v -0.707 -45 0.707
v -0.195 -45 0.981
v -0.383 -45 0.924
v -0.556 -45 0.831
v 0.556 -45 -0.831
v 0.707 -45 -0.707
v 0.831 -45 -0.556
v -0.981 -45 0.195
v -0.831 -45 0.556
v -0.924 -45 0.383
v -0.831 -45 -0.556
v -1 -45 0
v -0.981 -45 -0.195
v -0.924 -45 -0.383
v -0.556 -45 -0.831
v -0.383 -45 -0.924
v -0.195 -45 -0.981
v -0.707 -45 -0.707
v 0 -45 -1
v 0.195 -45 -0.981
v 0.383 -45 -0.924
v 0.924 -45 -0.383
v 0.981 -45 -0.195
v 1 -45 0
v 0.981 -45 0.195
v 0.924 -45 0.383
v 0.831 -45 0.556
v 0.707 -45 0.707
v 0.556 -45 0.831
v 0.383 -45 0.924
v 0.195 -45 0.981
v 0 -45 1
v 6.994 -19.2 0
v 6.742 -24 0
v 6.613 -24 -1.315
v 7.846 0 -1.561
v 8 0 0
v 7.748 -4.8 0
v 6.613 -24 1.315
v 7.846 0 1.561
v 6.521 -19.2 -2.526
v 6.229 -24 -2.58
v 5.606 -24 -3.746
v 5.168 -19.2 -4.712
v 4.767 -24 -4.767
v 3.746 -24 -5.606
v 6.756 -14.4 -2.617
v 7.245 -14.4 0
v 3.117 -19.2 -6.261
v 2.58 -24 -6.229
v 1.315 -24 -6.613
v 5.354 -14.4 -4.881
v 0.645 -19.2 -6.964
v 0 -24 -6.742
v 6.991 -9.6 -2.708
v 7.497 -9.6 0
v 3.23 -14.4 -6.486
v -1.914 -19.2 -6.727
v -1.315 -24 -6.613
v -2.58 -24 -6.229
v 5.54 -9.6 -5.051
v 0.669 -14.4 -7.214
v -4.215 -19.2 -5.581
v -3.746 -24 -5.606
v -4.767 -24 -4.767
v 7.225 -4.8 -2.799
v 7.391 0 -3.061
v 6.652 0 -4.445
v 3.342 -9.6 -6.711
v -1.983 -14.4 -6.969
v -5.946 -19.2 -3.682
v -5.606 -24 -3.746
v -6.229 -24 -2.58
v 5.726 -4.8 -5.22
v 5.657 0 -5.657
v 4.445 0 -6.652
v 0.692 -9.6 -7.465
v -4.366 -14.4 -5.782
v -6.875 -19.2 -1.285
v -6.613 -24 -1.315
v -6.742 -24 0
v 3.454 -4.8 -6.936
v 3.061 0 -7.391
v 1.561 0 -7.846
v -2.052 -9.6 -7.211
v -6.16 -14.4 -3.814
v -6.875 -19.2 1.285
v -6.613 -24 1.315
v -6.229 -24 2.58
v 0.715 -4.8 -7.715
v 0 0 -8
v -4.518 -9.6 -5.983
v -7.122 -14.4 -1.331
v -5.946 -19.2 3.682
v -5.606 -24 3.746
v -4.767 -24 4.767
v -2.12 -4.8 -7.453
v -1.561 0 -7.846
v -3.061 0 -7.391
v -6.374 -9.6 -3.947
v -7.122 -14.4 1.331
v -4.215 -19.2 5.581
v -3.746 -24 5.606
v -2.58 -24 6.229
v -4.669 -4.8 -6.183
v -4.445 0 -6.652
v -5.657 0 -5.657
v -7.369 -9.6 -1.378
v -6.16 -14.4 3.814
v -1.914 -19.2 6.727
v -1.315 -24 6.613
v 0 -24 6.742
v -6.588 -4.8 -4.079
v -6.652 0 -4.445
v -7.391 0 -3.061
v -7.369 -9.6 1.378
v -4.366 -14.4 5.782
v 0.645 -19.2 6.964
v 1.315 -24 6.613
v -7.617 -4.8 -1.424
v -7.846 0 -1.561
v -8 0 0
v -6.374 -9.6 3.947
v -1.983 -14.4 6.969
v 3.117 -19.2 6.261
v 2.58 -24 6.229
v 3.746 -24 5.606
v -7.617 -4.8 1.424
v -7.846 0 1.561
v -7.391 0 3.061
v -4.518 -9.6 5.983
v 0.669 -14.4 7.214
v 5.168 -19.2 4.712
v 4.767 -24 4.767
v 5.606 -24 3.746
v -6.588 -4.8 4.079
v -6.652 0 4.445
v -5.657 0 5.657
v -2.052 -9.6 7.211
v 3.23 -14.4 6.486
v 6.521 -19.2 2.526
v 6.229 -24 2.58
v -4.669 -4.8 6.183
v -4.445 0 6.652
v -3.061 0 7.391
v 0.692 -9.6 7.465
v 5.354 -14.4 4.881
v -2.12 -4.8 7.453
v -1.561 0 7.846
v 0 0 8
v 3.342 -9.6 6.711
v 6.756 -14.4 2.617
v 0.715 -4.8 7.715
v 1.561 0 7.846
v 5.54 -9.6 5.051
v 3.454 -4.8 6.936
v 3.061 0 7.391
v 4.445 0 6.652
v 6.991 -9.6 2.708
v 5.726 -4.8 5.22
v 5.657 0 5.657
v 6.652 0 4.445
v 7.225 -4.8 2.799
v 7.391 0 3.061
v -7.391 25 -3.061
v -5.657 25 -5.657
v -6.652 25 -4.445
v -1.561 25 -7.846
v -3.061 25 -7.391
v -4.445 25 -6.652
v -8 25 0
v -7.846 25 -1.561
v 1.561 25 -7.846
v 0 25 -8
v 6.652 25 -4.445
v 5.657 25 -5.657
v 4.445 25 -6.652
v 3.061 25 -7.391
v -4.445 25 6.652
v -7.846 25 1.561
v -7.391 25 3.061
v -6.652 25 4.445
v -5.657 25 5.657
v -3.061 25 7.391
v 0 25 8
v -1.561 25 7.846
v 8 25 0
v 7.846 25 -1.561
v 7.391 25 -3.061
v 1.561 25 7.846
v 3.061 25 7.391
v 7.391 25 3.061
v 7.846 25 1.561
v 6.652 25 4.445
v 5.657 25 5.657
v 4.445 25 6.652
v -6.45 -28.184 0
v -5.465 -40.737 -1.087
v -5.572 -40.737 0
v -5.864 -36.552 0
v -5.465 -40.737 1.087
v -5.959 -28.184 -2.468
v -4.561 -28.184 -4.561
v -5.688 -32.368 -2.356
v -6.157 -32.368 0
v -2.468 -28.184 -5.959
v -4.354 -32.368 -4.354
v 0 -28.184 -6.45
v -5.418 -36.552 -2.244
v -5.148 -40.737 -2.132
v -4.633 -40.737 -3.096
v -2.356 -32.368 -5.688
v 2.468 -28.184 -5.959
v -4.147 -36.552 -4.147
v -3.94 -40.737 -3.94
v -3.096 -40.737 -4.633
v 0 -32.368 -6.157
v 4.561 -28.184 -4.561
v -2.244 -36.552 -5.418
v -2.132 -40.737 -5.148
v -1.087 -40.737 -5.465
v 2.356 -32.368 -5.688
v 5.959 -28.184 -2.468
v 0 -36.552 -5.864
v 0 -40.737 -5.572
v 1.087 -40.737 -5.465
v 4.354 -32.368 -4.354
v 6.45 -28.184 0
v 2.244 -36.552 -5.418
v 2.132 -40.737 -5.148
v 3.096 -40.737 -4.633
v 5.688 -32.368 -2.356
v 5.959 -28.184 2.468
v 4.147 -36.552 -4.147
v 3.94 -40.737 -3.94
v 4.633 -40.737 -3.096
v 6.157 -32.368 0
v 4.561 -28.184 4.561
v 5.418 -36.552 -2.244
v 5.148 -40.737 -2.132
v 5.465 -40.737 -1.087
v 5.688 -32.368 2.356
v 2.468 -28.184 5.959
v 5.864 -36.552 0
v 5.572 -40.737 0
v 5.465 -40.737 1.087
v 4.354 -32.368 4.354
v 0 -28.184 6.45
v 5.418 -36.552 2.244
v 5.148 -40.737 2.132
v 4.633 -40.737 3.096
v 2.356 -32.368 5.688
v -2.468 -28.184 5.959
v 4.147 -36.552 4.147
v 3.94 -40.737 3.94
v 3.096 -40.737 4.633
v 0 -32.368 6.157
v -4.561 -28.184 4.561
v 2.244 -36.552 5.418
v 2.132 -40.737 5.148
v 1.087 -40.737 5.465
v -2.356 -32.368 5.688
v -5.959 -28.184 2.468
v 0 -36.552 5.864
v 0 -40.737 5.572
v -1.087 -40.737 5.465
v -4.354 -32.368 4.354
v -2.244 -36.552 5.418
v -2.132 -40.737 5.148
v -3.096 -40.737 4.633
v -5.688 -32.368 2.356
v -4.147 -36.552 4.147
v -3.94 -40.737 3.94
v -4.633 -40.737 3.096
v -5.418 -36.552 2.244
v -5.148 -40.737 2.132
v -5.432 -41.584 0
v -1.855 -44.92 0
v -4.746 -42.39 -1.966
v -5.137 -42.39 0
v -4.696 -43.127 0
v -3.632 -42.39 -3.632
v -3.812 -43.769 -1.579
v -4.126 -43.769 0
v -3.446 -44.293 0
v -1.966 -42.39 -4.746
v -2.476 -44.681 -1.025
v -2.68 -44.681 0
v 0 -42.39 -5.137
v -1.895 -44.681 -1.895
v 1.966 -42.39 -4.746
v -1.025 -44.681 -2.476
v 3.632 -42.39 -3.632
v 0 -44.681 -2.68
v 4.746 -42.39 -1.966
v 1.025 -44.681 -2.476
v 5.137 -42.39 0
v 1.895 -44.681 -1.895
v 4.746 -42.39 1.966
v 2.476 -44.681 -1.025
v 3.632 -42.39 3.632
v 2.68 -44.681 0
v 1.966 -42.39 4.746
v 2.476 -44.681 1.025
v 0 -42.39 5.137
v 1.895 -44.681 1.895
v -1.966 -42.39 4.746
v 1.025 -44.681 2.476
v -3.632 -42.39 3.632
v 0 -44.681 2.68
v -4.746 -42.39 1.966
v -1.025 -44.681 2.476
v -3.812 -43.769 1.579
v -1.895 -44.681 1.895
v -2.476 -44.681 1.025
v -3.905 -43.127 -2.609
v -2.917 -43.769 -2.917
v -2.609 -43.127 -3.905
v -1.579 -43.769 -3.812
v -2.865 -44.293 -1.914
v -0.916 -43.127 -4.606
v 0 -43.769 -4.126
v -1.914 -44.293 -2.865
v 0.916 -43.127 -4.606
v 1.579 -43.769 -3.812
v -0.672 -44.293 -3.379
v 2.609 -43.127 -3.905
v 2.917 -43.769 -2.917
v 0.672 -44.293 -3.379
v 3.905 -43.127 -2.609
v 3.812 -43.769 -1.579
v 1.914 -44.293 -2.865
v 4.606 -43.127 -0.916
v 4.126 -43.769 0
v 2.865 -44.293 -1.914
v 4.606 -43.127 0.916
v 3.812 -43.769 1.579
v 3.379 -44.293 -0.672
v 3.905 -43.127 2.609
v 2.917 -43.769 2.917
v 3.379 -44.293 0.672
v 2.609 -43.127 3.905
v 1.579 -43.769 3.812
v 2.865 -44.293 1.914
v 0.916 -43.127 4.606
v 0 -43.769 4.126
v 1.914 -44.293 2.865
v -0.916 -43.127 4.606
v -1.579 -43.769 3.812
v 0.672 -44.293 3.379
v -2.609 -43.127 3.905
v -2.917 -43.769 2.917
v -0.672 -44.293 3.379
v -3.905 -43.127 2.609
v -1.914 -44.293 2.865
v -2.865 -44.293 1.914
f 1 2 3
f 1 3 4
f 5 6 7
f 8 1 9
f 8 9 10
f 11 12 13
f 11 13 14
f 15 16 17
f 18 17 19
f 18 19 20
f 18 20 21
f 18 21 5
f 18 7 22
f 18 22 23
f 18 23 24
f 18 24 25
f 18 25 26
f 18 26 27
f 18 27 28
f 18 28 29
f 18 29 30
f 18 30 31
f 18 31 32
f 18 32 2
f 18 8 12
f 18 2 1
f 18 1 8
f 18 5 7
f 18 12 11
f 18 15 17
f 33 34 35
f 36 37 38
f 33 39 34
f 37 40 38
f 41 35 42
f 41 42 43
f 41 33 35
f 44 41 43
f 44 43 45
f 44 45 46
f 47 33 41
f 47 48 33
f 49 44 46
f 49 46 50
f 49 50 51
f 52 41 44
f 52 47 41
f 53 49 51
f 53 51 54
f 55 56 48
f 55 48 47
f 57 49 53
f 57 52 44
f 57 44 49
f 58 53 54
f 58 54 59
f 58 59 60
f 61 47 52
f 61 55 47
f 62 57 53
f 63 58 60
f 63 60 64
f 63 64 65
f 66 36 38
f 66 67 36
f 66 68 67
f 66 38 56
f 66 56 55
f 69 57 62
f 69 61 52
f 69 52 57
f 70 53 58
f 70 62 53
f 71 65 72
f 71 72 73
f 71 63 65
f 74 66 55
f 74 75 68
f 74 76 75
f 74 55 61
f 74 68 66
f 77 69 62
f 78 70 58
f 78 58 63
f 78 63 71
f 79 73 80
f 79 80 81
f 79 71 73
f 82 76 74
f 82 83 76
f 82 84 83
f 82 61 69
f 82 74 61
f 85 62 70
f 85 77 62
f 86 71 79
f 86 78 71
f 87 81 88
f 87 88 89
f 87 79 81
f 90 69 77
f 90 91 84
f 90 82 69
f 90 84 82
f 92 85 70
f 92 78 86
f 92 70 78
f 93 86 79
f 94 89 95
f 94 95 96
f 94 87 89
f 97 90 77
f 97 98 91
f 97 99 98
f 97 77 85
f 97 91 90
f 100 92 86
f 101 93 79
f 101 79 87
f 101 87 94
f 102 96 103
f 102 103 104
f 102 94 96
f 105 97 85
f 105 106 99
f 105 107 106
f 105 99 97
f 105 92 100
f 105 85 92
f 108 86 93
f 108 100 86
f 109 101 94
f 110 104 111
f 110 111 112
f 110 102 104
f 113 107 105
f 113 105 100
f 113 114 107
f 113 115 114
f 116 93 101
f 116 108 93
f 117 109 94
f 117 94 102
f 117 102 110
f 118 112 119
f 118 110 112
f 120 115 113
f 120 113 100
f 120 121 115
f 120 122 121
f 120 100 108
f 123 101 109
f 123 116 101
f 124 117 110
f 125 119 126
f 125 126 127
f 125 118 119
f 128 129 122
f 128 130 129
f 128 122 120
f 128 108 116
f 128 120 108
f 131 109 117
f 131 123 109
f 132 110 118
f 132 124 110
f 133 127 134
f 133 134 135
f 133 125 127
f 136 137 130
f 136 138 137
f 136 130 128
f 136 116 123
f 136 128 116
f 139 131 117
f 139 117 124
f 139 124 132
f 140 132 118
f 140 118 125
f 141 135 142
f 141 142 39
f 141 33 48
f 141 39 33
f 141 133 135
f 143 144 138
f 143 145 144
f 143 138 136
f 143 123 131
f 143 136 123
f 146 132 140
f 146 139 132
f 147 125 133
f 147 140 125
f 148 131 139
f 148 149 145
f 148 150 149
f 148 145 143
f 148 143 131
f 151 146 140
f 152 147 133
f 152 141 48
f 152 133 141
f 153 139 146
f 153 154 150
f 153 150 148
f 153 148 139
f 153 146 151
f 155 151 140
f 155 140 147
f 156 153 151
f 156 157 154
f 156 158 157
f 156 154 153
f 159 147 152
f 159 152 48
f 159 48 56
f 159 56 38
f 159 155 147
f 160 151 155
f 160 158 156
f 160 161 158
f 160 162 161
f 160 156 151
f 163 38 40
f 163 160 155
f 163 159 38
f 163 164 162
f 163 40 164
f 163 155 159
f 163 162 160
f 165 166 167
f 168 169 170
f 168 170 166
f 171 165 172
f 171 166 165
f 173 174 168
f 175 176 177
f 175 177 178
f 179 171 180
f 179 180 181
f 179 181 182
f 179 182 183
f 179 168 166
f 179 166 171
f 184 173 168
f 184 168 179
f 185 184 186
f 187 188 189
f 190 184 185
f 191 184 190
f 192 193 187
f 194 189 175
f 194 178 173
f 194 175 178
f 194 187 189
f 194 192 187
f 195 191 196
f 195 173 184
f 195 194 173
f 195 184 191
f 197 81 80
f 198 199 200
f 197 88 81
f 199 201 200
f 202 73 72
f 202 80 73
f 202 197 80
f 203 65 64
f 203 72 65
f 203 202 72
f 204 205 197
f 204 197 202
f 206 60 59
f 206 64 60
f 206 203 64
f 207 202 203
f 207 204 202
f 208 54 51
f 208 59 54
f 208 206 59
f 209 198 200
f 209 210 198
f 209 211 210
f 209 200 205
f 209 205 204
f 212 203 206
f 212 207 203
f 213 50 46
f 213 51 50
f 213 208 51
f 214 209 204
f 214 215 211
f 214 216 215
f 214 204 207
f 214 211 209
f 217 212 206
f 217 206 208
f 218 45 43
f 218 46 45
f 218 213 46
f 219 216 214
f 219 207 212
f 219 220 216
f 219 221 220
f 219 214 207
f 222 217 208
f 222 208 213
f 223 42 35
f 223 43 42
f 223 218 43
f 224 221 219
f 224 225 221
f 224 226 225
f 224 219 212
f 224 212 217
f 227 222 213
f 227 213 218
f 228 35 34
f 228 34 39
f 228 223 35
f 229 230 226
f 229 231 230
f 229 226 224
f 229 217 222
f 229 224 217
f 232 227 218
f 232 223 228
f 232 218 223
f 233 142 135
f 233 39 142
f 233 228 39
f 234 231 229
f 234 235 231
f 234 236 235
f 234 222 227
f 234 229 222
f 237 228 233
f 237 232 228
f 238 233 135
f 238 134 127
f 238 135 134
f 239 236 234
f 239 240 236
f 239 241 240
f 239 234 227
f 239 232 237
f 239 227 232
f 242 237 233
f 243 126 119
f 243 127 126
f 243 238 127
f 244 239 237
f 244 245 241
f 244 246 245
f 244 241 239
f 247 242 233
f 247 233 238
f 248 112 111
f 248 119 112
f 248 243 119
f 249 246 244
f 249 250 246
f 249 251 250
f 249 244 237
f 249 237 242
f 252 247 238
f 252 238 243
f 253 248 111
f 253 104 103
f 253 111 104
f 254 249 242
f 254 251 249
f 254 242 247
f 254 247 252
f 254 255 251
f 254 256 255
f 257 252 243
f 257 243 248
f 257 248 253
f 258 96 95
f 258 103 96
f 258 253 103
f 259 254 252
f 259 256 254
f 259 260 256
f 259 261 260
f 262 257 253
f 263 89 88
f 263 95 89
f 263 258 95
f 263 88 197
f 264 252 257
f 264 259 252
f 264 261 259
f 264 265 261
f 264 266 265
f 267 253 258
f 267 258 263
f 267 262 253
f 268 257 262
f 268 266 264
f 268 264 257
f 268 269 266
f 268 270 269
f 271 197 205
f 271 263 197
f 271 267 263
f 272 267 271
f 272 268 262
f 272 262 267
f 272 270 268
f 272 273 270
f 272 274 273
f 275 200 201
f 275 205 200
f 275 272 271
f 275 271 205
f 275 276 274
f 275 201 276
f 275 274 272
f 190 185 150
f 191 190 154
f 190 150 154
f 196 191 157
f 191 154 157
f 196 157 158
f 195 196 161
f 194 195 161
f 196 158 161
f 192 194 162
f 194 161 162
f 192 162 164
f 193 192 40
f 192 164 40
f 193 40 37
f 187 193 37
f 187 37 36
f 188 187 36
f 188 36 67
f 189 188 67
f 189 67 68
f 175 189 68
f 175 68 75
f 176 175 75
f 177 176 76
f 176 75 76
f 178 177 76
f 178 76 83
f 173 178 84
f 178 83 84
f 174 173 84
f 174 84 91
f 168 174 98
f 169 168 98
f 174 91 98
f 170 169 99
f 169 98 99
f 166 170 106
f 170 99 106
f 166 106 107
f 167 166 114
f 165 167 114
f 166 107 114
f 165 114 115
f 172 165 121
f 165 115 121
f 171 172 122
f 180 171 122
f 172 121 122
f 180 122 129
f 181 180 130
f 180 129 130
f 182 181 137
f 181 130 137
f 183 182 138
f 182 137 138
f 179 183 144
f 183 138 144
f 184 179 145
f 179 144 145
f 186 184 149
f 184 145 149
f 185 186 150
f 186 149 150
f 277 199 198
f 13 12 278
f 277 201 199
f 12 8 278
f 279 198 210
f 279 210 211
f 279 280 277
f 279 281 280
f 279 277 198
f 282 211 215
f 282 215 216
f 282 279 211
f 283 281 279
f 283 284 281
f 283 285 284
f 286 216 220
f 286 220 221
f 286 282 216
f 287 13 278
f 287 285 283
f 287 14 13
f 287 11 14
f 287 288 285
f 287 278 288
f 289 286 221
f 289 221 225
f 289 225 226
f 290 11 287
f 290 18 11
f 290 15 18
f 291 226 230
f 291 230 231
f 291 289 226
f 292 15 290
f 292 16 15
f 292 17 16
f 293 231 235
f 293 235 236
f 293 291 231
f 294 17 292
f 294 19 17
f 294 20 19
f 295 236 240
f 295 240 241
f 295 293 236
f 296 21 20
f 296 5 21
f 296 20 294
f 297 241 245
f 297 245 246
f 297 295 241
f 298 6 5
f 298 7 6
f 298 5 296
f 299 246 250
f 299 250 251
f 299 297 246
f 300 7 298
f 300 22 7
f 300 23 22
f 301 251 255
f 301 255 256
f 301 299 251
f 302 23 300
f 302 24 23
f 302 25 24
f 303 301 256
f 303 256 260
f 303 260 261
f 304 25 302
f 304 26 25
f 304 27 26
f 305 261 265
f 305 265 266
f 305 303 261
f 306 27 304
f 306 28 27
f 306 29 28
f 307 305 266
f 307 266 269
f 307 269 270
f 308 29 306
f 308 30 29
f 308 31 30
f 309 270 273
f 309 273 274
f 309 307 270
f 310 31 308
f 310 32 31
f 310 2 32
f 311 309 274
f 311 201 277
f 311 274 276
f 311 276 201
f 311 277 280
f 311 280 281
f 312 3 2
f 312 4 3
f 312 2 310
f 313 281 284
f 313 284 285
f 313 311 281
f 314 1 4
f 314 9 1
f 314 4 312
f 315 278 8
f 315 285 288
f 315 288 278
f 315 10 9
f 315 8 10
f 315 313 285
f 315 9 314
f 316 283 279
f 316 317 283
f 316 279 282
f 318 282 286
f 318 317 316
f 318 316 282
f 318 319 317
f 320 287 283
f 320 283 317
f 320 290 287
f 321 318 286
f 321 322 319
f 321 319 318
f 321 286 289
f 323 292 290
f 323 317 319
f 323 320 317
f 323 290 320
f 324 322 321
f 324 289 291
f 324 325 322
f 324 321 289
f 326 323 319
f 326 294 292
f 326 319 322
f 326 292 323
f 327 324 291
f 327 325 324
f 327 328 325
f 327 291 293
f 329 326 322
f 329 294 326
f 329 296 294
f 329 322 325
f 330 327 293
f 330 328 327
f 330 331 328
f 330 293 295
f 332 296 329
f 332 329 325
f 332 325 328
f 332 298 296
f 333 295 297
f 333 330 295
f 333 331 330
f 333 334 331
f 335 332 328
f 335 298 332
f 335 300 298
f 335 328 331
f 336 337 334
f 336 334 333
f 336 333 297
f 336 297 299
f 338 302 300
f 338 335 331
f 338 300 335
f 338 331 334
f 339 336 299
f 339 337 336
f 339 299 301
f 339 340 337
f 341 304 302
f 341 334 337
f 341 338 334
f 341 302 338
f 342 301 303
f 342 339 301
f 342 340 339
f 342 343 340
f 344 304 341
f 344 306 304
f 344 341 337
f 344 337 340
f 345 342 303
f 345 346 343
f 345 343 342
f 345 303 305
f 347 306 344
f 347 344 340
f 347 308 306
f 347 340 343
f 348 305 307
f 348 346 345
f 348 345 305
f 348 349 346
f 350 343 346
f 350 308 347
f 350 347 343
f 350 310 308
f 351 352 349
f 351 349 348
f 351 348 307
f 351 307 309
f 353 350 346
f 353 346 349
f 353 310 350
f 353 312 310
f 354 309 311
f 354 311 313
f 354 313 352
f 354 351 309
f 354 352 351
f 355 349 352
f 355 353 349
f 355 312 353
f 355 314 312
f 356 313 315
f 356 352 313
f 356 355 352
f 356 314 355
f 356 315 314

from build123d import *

# Parameters (mm, degrees)
SKETCH_608_R    = 8
EXTRUDE_1_DEPTH = 25


# Read off the part's stored shape, not the designer's step: 凸台-拉伸2
with BuildPart() as part:
    # Sketch 608 → 凸台-拉伸1 (new body)
    with BuildSketch(Plane(origin=(0, 0, 0), x_dir=(1, 0, 0), z_dir=(0, 1, 0))):
        with Locations(Location((0, 0, 0), (0, 0, 270))):
            Circle(SKETCH_608_R)
    extrude(amount=EXTRUDE_1_DEPTH)

    # 凸台-拉伸2 outline → 凸台-拉伸2 (revolve)
    with BuildSketch(Plane.XY):
        Polygon((0, -24), (6.742213297, -24), (8, 0), (0, 0), align=None)
    revolve(axis=Axis((0, 0, 0), (0, 1, 0)))

    # 草图7 → 旋转4 (revolve)
    with BuildSketch(Plane.XY, mode=Mode.PRIVATE) as revolve_4_sk:
        with BuildLine():
            Line((0, -24), (6.742213297, -24))
            Line((6.742213297, -24), (5.571871993, -40.736660394))
            ThreePointArc((5.571871993, -40.736660394), (4.125623062, -43.768784333), (1, -45))
            Line((1, -45), (0, -45))
            Line((0, -45), (0, -24))
        make_face()
    revolve(revolve_4_sk.sketch.rotate(Axis((0, -24, 0), (0, -1, 0)), 180), axis=Axis((0, -24, 0), (0, -1, 0)))


solid = part.part
